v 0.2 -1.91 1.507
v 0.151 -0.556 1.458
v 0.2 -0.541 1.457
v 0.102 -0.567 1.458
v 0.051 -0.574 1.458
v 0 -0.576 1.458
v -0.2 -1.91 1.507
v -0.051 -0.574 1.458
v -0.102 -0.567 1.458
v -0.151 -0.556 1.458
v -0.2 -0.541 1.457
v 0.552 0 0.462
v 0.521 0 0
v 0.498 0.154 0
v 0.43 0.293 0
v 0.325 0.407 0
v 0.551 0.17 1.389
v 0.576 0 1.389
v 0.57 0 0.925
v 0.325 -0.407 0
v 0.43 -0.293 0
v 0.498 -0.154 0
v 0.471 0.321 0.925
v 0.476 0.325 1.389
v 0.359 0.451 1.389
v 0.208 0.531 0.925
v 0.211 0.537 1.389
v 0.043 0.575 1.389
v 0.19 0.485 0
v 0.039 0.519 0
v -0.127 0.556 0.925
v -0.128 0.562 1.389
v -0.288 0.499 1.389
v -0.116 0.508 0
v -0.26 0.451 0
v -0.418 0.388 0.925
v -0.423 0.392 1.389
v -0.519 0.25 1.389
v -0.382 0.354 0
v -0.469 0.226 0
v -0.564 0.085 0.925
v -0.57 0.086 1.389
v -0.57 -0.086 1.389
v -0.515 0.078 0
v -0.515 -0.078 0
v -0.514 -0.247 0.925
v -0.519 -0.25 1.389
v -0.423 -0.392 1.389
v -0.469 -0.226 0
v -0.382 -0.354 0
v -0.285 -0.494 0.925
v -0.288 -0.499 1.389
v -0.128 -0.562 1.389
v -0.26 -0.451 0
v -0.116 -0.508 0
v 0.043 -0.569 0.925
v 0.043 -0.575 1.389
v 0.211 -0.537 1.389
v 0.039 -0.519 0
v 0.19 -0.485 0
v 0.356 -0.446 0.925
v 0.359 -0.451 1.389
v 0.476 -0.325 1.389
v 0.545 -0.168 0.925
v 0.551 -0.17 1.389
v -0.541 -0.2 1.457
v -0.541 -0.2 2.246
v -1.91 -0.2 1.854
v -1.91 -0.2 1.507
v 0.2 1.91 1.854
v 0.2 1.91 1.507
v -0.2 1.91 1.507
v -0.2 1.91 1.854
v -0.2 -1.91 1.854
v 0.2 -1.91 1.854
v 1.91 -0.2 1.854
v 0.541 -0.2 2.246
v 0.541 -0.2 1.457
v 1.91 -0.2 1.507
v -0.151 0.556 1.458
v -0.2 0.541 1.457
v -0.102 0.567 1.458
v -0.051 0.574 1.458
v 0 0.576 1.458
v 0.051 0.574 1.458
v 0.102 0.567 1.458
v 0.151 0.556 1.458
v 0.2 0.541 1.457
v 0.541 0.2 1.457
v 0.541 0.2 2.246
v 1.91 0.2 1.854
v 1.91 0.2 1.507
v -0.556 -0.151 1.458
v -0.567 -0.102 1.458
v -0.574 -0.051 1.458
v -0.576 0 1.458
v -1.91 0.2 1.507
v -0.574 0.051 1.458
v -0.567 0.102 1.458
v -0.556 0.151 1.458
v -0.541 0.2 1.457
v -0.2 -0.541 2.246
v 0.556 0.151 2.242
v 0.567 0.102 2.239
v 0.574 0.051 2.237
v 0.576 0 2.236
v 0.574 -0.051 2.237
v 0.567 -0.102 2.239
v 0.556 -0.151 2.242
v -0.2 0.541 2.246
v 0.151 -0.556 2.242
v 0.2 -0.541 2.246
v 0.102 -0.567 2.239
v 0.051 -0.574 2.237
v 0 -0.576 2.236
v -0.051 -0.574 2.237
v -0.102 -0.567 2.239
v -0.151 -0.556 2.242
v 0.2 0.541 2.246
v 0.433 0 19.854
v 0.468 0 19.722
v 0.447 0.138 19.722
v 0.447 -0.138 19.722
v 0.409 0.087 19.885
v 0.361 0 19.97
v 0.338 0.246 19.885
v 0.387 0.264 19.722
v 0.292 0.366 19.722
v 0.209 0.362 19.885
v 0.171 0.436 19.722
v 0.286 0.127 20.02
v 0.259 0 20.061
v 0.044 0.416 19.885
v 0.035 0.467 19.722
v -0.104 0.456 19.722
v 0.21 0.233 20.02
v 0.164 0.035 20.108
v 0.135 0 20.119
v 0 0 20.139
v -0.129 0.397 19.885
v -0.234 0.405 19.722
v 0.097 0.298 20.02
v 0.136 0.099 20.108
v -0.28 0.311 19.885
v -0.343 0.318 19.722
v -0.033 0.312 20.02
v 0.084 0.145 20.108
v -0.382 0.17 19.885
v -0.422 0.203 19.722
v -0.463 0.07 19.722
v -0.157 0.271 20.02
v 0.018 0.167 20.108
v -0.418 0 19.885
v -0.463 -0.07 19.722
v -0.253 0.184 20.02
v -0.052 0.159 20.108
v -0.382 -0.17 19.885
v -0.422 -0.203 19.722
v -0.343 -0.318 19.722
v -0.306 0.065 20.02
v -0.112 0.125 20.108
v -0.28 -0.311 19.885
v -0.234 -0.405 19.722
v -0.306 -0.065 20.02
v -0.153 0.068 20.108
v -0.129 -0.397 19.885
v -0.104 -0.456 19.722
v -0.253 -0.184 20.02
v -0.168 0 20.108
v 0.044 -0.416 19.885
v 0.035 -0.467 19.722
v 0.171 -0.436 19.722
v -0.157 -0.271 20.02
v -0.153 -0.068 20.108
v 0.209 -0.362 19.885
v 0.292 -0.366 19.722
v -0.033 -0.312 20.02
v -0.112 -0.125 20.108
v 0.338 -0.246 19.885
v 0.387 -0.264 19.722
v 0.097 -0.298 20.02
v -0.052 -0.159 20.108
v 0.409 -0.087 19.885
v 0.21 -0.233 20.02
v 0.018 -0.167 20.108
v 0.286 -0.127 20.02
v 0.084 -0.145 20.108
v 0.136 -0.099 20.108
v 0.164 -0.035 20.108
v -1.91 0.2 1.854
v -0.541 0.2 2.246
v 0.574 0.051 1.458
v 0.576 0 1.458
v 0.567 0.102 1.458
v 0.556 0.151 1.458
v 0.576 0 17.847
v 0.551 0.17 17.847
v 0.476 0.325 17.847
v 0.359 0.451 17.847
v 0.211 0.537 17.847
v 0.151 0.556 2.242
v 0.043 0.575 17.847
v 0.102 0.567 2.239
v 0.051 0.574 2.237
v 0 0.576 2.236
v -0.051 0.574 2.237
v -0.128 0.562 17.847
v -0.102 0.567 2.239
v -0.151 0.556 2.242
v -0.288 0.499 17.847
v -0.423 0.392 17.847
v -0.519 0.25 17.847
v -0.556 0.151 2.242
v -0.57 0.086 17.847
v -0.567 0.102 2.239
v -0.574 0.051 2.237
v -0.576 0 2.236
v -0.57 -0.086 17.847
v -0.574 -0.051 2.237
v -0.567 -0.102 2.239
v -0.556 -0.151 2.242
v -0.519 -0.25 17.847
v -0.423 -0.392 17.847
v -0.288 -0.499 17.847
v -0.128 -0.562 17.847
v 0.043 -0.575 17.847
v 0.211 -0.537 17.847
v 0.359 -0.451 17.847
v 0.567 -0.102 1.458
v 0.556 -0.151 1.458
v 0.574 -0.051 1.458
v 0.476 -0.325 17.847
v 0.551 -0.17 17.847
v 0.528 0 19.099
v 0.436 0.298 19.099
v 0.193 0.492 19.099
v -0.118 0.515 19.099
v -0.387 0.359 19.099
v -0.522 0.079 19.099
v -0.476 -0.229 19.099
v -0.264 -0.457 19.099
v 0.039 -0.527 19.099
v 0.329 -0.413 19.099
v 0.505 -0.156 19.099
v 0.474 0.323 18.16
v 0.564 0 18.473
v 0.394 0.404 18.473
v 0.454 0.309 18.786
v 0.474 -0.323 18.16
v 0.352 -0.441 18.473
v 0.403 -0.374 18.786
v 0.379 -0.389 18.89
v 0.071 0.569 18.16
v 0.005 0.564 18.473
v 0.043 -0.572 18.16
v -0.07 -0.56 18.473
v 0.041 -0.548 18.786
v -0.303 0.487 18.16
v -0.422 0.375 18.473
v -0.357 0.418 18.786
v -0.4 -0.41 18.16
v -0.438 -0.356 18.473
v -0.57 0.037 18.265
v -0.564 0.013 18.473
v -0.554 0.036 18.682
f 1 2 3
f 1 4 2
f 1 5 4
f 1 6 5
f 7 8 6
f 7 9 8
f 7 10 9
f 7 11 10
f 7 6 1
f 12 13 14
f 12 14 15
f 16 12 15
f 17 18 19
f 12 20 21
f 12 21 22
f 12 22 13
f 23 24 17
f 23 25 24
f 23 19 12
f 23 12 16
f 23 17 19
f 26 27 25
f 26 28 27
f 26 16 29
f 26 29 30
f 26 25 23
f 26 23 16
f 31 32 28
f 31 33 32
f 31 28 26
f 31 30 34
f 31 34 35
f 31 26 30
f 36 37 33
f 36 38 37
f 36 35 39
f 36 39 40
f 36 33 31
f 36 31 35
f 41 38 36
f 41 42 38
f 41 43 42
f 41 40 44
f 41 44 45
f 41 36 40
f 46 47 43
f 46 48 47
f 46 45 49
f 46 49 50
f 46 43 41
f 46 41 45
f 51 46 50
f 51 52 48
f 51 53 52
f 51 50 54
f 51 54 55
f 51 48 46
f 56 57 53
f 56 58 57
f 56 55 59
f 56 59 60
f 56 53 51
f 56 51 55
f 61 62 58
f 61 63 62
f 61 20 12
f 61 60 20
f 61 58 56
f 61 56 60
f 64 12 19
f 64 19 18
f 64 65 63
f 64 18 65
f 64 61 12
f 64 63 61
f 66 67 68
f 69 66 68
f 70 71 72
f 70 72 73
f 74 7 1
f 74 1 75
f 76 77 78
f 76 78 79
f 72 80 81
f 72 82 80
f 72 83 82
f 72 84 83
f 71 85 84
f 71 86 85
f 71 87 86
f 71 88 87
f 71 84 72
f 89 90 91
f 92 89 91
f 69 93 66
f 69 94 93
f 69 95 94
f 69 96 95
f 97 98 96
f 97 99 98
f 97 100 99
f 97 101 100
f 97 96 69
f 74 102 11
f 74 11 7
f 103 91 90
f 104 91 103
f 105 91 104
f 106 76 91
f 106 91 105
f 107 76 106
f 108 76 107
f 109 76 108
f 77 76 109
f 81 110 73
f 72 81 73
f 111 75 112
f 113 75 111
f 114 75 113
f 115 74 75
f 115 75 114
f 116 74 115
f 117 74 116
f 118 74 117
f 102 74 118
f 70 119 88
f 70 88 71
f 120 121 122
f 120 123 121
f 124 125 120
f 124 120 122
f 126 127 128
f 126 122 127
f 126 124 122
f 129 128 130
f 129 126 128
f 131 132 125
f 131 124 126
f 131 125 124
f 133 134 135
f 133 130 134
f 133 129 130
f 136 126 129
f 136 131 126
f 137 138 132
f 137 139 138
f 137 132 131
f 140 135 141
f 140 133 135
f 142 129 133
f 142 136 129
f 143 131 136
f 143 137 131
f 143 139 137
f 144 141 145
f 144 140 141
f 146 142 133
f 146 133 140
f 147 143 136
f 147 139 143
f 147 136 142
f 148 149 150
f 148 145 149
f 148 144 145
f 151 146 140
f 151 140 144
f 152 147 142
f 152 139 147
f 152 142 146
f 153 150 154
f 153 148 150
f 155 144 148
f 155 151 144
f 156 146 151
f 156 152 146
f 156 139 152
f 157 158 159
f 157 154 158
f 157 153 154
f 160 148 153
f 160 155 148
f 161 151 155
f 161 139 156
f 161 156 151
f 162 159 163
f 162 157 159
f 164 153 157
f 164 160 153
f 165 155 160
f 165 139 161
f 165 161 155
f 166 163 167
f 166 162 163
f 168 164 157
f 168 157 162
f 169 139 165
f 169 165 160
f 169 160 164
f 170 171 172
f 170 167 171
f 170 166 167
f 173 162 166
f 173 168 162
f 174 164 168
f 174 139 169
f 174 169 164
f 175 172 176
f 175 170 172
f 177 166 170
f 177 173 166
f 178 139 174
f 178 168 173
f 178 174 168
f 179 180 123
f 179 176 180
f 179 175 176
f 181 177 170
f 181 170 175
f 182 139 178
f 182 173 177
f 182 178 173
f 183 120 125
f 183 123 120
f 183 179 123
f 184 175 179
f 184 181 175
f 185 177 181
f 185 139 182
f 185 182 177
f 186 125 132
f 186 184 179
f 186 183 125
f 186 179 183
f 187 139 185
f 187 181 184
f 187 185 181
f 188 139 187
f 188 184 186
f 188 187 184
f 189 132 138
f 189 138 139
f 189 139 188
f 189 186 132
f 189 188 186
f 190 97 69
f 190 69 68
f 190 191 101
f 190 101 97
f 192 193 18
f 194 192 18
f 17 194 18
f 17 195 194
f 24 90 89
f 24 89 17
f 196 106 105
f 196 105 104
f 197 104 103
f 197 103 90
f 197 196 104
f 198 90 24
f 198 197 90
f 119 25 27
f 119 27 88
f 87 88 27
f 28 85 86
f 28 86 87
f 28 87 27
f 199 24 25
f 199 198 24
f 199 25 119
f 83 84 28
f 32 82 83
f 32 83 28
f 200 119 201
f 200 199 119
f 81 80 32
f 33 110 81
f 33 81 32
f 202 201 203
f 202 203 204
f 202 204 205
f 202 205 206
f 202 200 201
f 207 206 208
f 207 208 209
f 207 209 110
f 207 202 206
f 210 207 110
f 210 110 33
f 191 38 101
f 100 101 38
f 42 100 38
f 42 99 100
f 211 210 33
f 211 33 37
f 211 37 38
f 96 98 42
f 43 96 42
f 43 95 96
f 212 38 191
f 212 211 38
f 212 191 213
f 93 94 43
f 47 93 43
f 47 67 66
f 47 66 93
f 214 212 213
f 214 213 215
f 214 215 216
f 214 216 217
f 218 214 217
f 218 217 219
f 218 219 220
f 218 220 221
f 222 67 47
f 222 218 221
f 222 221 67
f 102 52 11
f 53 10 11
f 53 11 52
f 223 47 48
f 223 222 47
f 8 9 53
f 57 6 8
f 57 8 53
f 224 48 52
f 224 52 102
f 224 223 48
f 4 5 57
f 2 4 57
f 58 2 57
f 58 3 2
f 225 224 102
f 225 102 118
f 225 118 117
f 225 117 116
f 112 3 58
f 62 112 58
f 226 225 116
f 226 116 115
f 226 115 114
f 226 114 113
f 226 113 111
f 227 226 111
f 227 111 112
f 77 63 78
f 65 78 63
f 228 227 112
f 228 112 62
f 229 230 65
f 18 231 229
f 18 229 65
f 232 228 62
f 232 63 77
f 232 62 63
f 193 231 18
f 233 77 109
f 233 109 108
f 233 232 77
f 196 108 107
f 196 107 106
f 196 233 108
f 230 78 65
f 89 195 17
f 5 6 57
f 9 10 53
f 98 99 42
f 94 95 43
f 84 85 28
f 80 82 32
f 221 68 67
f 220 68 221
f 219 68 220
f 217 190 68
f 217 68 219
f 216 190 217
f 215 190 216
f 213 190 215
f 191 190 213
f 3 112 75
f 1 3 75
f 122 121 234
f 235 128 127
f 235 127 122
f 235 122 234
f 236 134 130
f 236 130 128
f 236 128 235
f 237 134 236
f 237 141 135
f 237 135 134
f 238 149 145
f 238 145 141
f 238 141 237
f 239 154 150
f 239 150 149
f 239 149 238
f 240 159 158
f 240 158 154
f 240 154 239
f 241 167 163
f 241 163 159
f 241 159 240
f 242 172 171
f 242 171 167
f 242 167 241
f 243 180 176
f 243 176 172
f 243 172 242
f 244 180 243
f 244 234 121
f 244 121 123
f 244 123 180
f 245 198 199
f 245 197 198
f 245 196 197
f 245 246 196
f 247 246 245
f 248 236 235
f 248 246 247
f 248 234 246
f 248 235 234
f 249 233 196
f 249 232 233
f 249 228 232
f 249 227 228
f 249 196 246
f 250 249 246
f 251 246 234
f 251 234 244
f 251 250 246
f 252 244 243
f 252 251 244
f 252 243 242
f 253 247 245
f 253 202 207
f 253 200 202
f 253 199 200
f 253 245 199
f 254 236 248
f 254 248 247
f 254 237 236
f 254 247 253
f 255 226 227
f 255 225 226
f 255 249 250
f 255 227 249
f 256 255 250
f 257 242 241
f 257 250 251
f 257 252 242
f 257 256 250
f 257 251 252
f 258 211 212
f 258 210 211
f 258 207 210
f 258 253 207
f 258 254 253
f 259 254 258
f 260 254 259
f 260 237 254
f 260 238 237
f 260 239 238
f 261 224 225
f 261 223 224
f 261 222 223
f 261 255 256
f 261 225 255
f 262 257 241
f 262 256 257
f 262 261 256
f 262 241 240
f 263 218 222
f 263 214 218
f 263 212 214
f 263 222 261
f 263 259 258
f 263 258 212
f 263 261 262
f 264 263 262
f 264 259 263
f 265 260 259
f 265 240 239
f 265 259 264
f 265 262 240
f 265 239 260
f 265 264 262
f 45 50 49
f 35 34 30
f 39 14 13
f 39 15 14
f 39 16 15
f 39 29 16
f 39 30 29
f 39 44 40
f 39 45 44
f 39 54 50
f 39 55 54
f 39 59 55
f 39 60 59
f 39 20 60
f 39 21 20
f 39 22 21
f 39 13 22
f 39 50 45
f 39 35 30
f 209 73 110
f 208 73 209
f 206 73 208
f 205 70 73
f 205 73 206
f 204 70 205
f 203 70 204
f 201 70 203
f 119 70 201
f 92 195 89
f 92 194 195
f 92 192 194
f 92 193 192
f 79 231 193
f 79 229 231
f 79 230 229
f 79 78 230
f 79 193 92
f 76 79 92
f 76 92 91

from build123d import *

# Parameters (mm, degrees)
F3_DEPTH = 0.2
F4_COUNT = 4


# Not quite as in the source:
# - a feature names something its author has since deleted; it is built from what else it names


with BuildPart() as f1:
    # F0 (on Front) → F1 (revolve)
    with BuildSketch(Plane.XZ):
        with BuildLine():
            Line((0, 20.1388888889), (0, 0))
            Line((0, 0), (0.5208333333, 0))
            ThreePointArc((0.5208333333, 0), (0.5624944489, 0.6938891109), (0.5763888889, 1.3888888889))
            Line((0.5763888889, 1.3888888889), (0.5763888889, 17.8472222222))
            ThreePointArc((0.5763888889, 17.8472222222), (0.5492348486, 18.7862912781), (0.467863469, 19.7222222222))
            ThreePointArc((0.467863469, 19.7222222222), (0.3132520298, 20.01962212), (0, 20.1388888889))
        make_face()
    revolve(axis=Axis((0, 0, 10.0694444444), (0, 0, 1)))

    # F2 (on Front) → F3 (join, symmetric)
    with BuildSketch(Plane.XZ):
        Polygon((0, 11.1135402694), (0, 1.4373737374), (1.9097222222, 1.5068181818), (1.9097222222, 1.854040404), (0.4, 2.2865129156), (0.4, 11.3888888889), align=None)
    extrude(amount=F3_DEPTH, both=True)

    # F4: F1 ×4 about axis
    f4_axis = Axis((0, 0, 1.3888888889), (0, 0, 1))


with BuildPart() as f1_1:
    add(f1.part)
    for i in range(1, F4_COUNT):
        add(f1.part.rotate(f4_axis, i * 360 / F4_COUNT))


solid = f1_1.part
